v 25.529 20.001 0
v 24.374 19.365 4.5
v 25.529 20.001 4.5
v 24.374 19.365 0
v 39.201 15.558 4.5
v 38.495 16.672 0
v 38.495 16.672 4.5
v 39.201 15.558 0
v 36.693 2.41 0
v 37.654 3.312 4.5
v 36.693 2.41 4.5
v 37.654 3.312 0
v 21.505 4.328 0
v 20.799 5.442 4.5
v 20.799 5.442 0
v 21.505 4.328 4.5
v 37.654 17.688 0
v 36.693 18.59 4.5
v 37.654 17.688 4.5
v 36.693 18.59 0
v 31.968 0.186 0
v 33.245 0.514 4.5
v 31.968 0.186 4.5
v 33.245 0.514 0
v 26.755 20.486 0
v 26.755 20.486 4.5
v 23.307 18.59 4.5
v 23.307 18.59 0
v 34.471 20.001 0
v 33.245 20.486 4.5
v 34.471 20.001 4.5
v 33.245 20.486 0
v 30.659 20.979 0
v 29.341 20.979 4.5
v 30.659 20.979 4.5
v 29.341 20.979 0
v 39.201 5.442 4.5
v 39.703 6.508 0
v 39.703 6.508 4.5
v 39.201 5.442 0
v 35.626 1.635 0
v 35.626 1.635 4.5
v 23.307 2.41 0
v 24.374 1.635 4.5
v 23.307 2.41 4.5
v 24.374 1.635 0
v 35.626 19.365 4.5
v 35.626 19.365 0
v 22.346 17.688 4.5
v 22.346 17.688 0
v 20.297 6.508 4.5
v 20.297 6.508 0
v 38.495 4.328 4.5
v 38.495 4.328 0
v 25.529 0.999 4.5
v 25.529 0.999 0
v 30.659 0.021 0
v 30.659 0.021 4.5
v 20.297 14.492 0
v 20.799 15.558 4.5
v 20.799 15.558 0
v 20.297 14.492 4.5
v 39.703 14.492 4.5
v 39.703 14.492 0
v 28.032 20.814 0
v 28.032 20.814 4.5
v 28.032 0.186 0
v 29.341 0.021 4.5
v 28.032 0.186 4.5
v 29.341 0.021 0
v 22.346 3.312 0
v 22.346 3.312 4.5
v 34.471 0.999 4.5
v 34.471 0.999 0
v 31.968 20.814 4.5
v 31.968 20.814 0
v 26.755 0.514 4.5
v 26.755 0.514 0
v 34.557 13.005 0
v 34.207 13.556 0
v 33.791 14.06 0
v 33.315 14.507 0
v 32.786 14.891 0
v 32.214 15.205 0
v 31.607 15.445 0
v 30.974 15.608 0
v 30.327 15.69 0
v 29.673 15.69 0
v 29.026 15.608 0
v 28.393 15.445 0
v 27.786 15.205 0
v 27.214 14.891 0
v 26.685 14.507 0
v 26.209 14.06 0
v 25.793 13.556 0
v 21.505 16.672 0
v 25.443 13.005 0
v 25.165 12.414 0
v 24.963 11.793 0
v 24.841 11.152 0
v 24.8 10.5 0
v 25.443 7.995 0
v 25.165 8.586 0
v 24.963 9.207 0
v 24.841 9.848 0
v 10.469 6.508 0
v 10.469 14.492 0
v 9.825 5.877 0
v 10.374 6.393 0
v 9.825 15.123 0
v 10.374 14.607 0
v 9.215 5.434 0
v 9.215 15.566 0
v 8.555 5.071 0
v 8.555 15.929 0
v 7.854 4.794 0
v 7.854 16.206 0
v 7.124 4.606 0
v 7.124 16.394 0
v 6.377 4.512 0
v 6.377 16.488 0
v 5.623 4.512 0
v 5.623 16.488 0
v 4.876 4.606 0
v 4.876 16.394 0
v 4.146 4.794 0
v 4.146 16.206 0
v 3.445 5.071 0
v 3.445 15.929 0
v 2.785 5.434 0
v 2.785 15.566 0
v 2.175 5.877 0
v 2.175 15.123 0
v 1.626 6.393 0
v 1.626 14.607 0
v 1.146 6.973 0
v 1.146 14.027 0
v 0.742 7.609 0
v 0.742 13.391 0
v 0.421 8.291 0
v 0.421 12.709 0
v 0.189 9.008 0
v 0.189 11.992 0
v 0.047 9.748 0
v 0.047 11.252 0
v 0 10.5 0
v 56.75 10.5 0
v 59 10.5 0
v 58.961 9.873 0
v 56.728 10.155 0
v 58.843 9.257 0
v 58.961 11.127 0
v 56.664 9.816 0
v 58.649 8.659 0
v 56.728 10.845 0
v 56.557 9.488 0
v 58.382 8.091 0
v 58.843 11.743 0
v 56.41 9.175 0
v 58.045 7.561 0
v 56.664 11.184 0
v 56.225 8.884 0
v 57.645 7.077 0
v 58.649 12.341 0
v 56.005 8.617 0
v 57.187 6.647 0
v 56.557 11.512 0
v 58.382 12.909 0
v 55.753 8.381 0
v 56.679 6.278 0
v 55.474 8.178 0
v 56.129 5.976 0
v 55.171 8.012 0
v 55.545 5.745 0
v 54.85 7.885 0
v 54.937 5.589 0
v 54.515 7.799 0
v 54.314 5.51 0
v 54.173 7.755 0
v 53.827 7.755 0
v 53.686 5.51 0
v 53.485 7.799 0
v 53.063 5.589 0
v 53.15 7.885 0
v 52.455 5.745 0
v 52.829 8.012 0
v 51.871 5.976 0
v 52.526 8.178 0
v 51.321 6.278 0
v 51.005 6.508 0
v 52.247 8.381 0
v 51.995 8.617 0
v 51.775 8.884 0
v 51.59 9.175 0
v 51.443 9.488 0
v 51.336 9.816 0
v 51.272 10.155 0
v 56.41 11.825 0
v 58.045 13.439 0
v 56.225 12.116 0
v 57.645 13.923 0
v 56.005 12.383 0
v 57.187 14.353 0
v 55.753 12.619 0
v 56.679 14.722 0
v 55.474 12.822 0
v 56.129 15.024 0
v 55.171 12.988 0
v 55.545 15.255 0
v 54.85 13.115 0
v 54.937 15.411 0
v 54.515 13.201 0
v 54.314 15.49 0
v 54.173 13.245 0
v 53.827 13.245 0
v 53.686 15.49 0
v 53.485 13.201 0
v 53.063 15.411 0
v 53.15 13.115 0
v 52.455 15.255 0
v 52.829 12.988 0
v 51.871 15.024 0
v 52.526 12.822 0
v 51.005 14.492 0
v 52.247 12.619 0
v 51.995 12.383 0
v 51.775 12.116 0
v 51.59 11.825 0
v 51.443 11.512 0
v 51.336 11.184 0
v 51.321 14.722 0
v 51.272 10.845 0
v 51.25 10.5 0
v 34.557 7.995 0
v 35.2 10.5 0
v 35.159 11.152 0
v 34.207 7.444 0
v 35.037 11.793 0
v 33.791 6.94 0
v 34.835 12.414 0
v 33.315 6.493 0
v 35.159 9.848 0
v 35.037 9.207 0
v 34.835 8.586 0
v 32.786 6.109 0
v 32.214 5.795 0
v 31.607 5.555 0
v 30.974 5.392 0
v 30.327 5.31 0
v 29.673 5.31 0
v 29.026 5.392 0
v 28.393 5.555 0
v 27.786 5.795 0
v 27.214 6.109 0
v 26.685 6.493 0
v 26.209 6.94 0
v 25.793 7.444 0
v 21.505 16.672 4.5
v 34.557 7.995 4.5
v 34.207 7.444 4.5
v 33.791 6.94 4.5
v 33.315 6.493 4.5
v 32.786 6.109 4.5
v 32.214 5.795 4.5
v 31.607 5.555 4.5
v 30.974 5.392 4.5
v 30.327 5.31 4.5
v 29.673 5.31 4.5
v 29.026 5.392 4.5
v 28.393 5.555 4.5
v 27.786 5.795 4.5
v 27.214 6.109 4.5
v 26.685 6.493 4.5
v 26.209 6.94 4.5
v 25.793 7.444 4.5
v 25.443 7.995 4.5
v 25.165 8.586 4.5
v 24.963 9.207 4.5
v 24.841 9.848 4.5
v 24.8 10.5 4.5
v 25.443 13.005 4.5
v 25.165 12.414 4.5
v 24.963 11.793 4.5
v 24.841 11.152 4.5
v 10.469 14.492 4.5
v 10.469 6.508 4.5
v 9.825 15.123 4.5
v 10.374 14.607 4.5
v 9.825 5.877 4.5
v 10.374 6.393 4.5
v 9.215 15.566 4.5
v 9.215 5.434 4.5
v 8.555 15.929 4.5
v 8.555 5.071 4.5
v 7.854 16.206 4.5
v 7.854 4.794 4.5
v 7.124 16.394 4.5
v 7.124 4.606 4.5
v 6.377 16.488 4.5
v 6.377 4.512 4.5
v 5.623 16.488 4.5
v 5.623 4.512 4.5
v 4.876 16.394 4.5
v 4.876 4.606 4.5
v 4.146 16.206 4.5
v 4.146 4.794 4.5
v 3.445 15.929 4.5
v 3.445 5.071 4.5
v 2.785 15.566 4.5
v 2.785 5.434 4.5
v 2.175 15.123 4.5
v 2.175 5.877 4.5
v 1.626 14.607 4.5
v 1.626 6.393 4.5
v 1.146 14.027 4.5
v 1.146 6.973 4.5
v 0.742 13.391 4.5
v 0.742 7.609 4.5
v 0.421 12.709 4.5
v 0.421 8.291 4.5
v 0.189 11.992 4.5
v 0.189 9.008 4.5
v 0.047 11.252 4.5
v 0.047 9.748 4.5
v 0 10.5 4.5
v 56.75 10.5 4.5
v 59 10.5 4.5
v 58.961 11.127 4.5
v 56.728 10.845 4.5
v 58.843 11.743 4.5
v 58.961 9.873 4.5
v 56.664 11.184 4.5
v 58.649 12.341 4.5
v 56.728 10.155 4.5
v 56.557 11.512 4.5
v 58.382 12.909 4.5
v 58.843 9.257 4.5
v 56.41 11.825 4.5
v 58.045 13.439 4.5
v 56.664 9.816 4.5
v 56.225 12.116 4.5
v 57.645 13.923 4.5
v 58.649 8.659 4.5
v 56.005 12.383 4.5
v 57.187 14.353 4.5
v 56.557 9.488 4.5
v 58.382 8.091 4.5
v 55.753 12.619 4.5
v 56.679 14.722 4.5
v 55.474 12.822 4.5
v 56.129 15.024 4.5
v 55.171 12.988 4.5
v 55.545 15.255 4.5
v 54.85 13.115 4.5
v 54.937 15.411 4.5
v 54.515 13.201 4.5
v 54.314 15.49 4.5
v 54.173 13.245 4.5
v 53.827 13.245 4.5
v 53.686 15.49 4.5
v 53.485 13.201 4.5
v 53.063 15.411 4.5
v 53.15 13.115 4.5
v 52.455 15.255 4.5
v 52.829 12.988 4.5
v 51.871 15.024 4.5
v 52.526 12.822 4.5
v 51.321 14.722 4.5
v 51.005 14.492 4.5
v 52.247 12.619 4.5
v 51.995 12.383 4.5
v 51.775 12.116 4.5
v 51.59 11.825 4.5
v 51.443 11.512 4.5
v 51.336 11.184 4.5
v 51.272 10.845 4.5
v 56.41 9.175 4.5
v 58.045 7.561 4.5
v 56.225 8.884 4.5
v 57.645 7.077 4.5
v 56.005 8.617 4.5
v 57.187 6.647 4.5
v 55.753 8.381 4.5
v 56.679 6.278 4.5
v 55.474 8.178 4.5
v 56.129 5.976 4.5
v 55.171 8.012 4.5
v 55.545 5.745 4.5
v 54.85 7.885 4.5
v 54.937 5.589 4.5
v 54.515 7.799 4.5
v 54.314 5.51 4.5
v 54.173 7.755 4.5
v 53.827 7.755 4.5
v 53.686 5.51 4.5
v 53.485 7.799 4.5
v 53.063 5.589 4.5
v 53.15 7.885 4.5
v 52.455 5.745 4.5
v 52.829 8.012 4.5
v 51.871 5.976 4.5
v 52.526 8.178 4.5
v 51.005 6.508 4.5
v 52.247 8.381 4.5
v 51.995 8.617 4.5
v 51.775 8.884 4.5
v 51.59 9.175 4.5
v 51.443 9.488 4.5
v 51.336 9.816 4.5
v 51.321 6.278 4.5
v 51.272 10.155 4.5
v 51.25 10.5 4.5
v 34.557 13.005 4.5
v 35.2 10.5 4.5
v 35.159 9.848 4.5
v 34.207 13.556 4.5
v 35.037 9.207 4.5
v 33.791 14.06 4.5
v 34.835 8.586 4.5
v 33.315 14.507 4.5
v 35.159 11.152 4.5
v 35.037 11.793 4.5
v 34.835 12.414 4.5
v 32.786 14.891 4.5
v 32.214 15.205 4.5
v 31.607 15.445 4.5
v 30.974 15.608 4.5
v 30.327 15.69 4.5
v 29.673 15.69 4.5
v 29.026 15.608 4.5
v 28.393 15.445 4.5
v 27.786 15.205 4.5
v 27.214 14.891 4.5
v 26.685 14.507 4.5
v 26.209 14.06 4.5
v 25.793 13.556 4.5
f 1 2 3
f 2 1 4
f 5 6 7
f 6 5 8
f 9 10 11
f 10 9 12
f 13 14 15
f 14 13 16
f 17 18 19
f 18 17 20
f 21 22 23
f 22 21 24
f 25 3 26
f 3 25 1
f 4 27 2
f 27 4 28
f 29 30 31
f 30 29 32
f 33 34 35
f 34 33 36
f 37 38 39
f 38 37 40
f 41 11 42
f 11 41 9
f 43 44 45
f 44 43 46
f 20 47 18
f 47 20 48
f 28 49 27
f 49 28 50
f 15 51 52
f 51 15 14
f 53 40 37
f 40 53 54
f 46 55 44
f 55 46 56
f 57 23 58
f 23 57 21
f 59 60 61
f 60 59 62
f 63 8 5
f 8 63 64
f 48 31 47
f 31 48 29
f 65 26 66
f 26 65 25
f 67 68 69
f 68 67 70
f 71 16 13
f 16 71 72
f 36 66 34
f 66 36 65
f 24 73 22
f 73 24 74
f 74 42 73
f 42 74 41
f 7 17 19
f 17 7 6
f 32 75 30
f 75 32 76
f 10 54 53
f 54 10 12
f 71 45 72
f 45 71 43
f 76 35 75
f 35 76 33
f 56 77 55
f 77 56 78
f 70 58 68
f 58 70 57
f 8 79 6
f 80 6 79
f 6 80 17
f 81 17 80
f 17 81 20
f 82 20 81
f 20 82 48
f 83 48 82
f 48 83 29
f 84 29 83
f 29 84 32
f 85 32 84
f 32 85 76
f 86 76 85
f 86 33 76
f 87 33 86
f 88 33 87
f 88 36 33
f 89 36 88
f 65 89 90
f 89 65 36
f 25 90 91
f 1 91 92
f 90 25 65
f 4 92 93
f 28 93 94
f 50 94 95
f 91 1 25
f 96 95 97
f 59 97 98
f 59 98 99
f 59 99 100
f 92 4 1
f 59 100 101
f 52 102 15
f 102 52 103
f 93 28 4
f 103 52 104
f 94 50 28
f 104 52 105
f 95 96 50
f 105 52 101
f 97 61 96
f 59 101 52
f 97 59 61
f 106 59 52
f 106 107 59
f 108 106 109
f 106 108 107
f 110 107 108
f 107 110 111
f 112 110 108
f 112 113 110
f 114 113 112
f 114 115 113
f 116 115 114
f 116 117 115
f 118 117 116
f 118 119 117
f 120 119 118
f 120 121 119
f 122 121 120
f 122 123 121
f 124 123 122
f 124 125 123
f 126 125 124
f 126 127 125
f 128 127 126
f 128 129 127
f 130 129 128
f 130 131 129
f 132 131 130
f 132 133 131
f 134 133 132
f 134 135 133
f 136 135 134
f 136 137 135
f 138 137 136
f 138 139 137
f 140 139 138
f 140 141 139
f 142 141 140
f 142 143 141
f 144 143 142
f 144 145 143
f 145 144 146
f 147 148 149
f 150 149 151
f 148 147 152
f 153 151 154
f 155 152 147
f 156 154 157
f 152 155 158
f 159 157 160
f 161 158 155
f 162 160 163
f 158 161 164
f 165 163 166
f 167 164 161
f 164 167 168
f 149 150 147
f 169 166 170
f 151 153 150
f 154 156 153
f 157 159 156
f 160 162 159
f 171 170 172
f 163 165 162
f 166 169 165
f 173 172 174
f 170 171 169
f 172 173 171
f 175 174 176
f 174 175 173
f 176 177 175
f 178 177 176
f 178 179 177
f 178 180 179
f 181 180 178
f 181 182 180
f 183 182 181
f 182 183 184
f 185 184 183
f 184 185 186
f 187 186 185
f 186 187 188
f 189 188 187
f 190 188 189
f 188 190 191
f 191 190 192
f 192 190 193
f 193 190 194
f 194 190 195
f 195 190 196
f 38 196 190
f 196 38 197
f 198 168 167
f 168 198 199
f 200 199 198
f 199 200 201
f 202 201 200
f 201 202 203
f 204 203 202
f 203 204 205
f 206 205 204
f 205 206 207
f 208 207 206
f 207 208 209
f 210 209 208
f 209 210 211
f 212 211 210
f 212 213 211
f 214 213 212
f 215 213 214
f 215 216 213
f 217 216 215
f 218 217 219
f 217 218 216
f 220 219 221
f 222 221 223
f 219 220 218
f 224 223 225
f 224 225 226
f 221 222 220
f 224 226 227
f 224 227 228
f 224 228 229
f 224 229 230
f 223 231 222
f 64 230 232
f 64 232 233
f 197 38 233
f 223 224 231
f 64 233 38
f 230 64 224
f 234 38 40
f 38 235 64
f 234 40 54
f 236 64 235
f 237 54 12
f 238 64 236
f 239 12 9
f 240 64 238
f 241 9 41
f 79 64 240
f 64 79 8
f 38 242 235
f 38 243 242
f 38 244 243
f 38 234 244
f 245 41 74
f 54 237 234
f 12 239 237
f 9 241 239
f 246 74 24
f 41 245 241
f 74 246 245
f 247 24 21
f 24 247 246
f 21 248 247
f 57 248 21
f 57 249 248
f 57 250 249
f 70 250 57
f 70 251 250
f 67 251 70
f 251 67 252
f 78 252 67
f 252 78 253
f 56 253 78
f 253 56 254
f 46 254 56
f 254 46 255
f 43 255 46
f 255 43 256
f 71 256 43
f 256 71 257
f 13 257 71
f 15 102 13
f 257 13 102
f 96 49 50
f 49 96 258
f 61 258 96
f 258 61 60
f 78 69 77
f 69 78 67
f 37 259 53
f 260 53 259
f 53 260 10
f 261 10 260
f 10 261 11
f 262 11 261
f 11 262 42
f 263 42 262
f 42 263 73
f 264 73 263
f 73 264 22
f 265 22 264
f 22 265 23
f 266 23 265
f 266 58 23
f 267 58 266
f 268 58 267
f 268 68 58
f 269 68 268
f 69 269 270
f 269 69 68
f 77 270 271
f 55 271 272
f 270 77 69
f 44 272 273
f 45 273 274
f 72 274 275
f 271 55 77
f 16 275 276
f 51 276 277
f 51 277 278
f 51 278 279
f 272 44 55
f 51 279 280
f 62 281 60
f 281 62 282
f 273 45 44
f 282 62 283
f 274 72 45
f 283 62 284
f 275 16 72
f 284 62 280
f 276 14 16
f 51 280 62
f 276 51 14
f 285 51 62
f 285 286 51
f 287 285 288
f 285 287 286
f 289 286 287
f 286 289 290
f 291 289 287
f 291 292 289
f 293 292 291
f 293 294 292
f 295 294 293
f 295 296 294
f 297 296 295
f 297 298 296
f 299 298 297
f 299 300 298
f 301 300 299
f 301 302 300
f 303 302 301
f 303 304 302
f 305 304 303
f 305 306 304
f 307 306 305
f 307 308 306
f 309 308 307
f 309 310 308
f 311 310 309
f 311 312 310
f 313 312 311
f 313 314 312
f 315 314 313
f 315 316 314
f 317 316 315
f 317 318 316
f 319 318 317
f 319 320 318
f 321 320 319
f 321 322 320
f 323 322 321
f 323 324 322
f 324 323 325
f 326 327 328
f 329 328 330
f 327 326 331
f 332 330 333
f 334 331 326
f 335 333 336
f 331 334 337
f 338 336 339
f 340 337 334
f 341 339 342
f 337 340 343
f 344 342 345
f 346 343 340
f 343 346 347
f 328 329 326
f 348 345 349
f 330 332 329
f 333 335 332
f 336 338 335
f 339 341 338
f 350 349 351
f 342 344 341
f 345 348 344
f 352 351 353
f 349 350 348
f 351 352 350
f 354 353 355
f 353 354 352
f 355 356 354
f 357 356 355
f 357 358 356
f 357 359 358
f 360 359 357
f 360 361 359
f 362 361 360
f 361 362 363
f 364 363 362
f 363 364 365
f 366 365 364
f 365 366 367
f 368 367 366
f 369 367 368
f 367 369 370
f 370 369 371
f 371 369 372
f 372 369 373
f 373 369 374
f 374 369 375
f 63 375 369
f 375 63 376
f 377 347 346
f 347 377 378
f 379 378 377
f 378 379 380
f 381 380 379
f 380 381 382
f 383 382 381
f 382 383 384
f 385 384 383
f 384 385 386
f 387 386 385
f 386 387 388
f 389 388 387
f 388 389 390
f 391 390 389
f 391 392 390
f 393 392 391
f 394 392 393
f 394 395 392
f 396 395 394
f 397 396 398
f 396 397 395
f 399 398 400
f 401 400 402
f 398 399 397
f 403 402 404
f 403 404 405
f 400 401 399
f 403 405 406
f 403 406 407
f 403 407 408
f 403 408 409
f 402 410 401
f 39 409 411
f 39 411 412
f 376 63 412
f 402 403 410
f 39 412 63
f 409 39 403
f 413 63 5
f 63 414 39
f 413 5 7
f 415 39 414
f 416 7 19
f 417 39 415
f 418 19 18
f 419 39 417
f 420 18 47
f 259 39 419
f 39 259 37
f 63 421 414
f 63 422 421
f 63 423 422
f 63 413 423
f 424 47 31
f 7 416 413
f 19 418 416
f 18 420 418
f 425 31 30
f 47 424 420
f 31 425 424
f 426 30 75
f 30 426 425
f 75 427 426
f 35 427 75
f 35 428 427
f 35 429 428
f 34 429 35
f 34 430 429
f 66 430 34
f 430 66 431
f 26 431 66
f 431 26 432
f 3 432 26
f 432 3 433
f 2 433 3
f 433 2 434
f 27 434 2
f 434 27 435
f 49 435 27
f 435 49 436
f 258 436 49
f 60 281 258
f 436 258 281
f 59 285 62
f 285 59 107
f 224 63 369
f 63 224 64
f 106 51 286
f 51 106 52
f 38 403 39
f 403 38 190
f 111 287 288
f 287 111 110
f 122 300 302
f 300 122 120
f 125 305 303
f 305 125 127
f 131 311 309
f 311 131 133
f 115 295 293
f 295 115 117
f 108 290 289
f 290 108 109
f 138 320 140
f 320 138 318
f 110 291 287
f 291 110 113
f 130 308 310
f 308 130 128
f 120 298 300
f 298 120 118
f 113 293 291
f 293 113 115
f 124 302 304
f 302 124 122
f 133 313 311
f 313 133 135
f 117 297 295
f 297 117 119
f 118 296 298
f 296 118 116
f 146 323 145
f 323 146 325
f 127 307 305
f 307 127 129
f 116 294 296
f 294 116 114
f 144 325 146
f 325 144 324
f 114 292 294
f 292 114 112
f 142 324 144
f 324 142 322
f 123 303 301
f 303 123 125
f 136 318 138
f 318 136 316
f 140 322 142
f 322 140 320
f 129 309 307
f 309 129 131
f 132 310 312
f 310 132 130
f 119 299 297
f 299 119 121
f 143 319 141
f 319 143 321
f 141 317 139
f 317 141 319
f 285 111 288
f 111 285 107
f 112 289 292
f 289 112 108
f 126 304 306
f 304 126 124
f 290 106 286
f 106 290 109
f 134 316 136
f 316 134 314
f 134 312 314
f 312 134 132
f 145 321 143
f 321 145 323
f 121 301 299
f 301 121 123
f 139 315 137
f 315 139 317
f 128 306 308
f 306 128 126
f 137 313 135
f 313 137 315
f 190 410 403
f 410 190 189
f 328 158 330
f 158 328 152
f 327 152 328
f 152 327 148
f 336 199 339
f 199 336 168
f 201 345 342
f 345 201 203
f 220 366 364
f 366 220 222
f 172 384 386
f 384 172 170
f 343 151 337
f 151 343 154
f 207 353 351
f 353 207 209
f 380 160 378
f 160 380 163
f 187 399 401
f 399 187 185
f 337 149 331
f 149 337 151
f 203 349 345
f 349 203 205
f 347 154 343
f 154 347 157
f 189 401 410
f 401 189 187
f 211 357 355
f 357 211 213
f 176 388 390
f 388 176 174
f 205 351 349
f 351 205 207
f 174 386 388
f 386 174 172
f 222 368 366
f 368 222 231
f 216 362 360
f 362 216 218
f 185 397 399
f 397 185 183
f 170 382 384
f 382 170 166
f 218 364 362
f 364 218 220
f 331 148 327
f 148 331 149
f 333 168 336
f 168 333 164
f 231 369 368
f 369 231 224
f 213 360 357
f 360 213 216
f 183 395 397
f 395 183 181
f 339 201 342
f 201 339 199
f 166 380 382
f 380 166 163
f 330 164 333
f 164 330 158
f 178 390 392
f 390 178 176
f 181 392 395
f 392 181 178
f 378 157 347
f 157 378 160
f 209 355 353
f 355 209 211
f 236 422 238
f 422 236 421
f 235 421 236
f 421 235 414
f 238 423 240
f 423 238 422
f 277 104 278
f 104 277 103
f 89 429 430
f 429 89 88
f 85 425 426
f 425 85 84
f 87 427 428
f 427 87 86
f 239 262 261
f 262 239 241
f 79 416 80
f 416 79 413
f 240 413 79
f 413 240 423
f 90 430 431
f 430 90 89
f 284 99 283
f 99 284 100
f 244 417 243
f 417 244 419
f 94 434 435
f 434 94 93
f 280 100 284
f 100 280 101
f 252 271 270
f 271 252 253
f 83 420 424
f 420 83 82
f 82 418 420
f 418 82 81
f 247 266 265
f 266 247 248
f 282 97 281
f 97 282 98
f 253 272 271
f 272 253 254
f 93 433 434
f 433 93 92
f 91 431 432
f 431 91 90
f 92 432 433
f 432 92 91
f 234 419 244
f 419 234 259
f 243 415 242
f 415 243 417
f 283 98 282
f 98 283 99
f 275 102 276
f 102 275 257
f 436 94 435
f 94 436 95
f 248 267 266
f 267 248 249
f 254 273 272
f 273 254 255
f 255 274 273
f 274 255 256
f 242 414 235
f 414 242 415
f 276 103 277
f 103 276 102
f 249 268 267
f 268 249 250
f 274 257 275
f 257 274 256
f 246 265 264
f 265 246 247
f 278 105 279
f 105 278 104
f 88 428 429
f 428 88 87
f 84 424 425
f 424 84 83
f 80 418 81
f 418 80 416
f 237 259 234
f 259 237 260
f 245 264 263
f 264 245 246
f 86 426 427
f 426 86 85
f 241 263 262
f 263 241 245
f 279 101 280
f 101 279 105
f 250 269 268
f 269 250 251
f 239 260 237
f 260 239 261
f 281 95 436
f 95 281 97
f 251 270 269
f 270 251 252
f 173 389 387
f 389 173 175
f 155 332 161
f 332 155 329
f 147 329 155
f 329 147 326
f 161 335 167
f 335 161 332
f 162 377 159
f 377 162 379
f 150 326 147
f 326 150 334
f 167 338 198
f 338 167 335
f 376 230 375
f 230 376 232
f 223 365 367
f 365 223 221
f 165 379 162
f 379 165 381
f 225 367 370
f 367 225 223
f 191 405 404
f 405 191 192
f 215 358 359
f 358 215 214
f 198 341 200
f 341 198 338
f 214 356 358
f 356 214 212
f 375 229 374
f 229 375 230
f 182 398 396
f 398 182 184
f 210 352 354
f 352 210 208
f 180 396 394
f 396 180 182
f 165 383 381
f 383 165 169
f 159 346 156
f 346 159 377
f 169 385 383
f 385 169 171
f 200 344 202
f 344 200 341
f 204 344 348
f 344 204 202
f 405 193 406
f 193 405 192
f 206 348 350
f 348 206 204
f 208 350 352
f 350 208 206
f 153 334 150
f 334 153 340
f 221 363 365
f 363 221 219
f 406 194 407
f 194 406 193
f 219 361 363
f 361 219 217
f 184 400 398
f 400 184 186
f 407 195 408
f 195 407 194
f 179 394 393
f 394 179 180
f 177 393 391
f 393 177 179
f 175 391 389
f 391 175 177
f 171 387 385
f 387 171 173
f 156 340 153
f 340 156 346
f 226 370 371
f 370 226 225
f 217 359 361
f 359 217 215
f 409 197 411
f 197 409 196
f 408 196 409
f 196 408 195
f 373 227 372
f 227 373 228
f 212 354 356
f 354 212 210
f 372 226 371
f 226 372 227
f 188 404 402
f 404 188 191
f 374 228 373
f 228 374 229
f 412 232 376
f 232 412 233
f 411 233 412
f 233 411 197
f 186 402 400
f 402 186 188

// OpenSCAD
translate([30, 10.5, 0]) {
  difference() {
    difference() {
      union() {
        union() {
          union() {
            cylinder(h = 4.5, r = 10.5);
            hull() {
              translate([-24, 0, 0]) {
                cylinder(h = 4.5, r = 4);
              }
              translate([24, 0, 0]) {
                cylinder(h = 4.5, r = 4);
              }
            }
          }
          translate([-24, 0, 0]) {
            cylinder(h = 4.5, r = 6);
          }
        }
        translate([24, 0, 0]) {
          cylinder(h = 4.5, r = 5);
        }
      }
      translate([0, 0, -0.2]) {
        cylinder(h = 4.9, r = 5.2);
      }
    }
    translate([24, 0, 0]) {
      translate([0, 0, -0.2]) {
        cylinder(h = 4.9, r = 2.75);
      }
    }
  }
}
$fn = 50;
